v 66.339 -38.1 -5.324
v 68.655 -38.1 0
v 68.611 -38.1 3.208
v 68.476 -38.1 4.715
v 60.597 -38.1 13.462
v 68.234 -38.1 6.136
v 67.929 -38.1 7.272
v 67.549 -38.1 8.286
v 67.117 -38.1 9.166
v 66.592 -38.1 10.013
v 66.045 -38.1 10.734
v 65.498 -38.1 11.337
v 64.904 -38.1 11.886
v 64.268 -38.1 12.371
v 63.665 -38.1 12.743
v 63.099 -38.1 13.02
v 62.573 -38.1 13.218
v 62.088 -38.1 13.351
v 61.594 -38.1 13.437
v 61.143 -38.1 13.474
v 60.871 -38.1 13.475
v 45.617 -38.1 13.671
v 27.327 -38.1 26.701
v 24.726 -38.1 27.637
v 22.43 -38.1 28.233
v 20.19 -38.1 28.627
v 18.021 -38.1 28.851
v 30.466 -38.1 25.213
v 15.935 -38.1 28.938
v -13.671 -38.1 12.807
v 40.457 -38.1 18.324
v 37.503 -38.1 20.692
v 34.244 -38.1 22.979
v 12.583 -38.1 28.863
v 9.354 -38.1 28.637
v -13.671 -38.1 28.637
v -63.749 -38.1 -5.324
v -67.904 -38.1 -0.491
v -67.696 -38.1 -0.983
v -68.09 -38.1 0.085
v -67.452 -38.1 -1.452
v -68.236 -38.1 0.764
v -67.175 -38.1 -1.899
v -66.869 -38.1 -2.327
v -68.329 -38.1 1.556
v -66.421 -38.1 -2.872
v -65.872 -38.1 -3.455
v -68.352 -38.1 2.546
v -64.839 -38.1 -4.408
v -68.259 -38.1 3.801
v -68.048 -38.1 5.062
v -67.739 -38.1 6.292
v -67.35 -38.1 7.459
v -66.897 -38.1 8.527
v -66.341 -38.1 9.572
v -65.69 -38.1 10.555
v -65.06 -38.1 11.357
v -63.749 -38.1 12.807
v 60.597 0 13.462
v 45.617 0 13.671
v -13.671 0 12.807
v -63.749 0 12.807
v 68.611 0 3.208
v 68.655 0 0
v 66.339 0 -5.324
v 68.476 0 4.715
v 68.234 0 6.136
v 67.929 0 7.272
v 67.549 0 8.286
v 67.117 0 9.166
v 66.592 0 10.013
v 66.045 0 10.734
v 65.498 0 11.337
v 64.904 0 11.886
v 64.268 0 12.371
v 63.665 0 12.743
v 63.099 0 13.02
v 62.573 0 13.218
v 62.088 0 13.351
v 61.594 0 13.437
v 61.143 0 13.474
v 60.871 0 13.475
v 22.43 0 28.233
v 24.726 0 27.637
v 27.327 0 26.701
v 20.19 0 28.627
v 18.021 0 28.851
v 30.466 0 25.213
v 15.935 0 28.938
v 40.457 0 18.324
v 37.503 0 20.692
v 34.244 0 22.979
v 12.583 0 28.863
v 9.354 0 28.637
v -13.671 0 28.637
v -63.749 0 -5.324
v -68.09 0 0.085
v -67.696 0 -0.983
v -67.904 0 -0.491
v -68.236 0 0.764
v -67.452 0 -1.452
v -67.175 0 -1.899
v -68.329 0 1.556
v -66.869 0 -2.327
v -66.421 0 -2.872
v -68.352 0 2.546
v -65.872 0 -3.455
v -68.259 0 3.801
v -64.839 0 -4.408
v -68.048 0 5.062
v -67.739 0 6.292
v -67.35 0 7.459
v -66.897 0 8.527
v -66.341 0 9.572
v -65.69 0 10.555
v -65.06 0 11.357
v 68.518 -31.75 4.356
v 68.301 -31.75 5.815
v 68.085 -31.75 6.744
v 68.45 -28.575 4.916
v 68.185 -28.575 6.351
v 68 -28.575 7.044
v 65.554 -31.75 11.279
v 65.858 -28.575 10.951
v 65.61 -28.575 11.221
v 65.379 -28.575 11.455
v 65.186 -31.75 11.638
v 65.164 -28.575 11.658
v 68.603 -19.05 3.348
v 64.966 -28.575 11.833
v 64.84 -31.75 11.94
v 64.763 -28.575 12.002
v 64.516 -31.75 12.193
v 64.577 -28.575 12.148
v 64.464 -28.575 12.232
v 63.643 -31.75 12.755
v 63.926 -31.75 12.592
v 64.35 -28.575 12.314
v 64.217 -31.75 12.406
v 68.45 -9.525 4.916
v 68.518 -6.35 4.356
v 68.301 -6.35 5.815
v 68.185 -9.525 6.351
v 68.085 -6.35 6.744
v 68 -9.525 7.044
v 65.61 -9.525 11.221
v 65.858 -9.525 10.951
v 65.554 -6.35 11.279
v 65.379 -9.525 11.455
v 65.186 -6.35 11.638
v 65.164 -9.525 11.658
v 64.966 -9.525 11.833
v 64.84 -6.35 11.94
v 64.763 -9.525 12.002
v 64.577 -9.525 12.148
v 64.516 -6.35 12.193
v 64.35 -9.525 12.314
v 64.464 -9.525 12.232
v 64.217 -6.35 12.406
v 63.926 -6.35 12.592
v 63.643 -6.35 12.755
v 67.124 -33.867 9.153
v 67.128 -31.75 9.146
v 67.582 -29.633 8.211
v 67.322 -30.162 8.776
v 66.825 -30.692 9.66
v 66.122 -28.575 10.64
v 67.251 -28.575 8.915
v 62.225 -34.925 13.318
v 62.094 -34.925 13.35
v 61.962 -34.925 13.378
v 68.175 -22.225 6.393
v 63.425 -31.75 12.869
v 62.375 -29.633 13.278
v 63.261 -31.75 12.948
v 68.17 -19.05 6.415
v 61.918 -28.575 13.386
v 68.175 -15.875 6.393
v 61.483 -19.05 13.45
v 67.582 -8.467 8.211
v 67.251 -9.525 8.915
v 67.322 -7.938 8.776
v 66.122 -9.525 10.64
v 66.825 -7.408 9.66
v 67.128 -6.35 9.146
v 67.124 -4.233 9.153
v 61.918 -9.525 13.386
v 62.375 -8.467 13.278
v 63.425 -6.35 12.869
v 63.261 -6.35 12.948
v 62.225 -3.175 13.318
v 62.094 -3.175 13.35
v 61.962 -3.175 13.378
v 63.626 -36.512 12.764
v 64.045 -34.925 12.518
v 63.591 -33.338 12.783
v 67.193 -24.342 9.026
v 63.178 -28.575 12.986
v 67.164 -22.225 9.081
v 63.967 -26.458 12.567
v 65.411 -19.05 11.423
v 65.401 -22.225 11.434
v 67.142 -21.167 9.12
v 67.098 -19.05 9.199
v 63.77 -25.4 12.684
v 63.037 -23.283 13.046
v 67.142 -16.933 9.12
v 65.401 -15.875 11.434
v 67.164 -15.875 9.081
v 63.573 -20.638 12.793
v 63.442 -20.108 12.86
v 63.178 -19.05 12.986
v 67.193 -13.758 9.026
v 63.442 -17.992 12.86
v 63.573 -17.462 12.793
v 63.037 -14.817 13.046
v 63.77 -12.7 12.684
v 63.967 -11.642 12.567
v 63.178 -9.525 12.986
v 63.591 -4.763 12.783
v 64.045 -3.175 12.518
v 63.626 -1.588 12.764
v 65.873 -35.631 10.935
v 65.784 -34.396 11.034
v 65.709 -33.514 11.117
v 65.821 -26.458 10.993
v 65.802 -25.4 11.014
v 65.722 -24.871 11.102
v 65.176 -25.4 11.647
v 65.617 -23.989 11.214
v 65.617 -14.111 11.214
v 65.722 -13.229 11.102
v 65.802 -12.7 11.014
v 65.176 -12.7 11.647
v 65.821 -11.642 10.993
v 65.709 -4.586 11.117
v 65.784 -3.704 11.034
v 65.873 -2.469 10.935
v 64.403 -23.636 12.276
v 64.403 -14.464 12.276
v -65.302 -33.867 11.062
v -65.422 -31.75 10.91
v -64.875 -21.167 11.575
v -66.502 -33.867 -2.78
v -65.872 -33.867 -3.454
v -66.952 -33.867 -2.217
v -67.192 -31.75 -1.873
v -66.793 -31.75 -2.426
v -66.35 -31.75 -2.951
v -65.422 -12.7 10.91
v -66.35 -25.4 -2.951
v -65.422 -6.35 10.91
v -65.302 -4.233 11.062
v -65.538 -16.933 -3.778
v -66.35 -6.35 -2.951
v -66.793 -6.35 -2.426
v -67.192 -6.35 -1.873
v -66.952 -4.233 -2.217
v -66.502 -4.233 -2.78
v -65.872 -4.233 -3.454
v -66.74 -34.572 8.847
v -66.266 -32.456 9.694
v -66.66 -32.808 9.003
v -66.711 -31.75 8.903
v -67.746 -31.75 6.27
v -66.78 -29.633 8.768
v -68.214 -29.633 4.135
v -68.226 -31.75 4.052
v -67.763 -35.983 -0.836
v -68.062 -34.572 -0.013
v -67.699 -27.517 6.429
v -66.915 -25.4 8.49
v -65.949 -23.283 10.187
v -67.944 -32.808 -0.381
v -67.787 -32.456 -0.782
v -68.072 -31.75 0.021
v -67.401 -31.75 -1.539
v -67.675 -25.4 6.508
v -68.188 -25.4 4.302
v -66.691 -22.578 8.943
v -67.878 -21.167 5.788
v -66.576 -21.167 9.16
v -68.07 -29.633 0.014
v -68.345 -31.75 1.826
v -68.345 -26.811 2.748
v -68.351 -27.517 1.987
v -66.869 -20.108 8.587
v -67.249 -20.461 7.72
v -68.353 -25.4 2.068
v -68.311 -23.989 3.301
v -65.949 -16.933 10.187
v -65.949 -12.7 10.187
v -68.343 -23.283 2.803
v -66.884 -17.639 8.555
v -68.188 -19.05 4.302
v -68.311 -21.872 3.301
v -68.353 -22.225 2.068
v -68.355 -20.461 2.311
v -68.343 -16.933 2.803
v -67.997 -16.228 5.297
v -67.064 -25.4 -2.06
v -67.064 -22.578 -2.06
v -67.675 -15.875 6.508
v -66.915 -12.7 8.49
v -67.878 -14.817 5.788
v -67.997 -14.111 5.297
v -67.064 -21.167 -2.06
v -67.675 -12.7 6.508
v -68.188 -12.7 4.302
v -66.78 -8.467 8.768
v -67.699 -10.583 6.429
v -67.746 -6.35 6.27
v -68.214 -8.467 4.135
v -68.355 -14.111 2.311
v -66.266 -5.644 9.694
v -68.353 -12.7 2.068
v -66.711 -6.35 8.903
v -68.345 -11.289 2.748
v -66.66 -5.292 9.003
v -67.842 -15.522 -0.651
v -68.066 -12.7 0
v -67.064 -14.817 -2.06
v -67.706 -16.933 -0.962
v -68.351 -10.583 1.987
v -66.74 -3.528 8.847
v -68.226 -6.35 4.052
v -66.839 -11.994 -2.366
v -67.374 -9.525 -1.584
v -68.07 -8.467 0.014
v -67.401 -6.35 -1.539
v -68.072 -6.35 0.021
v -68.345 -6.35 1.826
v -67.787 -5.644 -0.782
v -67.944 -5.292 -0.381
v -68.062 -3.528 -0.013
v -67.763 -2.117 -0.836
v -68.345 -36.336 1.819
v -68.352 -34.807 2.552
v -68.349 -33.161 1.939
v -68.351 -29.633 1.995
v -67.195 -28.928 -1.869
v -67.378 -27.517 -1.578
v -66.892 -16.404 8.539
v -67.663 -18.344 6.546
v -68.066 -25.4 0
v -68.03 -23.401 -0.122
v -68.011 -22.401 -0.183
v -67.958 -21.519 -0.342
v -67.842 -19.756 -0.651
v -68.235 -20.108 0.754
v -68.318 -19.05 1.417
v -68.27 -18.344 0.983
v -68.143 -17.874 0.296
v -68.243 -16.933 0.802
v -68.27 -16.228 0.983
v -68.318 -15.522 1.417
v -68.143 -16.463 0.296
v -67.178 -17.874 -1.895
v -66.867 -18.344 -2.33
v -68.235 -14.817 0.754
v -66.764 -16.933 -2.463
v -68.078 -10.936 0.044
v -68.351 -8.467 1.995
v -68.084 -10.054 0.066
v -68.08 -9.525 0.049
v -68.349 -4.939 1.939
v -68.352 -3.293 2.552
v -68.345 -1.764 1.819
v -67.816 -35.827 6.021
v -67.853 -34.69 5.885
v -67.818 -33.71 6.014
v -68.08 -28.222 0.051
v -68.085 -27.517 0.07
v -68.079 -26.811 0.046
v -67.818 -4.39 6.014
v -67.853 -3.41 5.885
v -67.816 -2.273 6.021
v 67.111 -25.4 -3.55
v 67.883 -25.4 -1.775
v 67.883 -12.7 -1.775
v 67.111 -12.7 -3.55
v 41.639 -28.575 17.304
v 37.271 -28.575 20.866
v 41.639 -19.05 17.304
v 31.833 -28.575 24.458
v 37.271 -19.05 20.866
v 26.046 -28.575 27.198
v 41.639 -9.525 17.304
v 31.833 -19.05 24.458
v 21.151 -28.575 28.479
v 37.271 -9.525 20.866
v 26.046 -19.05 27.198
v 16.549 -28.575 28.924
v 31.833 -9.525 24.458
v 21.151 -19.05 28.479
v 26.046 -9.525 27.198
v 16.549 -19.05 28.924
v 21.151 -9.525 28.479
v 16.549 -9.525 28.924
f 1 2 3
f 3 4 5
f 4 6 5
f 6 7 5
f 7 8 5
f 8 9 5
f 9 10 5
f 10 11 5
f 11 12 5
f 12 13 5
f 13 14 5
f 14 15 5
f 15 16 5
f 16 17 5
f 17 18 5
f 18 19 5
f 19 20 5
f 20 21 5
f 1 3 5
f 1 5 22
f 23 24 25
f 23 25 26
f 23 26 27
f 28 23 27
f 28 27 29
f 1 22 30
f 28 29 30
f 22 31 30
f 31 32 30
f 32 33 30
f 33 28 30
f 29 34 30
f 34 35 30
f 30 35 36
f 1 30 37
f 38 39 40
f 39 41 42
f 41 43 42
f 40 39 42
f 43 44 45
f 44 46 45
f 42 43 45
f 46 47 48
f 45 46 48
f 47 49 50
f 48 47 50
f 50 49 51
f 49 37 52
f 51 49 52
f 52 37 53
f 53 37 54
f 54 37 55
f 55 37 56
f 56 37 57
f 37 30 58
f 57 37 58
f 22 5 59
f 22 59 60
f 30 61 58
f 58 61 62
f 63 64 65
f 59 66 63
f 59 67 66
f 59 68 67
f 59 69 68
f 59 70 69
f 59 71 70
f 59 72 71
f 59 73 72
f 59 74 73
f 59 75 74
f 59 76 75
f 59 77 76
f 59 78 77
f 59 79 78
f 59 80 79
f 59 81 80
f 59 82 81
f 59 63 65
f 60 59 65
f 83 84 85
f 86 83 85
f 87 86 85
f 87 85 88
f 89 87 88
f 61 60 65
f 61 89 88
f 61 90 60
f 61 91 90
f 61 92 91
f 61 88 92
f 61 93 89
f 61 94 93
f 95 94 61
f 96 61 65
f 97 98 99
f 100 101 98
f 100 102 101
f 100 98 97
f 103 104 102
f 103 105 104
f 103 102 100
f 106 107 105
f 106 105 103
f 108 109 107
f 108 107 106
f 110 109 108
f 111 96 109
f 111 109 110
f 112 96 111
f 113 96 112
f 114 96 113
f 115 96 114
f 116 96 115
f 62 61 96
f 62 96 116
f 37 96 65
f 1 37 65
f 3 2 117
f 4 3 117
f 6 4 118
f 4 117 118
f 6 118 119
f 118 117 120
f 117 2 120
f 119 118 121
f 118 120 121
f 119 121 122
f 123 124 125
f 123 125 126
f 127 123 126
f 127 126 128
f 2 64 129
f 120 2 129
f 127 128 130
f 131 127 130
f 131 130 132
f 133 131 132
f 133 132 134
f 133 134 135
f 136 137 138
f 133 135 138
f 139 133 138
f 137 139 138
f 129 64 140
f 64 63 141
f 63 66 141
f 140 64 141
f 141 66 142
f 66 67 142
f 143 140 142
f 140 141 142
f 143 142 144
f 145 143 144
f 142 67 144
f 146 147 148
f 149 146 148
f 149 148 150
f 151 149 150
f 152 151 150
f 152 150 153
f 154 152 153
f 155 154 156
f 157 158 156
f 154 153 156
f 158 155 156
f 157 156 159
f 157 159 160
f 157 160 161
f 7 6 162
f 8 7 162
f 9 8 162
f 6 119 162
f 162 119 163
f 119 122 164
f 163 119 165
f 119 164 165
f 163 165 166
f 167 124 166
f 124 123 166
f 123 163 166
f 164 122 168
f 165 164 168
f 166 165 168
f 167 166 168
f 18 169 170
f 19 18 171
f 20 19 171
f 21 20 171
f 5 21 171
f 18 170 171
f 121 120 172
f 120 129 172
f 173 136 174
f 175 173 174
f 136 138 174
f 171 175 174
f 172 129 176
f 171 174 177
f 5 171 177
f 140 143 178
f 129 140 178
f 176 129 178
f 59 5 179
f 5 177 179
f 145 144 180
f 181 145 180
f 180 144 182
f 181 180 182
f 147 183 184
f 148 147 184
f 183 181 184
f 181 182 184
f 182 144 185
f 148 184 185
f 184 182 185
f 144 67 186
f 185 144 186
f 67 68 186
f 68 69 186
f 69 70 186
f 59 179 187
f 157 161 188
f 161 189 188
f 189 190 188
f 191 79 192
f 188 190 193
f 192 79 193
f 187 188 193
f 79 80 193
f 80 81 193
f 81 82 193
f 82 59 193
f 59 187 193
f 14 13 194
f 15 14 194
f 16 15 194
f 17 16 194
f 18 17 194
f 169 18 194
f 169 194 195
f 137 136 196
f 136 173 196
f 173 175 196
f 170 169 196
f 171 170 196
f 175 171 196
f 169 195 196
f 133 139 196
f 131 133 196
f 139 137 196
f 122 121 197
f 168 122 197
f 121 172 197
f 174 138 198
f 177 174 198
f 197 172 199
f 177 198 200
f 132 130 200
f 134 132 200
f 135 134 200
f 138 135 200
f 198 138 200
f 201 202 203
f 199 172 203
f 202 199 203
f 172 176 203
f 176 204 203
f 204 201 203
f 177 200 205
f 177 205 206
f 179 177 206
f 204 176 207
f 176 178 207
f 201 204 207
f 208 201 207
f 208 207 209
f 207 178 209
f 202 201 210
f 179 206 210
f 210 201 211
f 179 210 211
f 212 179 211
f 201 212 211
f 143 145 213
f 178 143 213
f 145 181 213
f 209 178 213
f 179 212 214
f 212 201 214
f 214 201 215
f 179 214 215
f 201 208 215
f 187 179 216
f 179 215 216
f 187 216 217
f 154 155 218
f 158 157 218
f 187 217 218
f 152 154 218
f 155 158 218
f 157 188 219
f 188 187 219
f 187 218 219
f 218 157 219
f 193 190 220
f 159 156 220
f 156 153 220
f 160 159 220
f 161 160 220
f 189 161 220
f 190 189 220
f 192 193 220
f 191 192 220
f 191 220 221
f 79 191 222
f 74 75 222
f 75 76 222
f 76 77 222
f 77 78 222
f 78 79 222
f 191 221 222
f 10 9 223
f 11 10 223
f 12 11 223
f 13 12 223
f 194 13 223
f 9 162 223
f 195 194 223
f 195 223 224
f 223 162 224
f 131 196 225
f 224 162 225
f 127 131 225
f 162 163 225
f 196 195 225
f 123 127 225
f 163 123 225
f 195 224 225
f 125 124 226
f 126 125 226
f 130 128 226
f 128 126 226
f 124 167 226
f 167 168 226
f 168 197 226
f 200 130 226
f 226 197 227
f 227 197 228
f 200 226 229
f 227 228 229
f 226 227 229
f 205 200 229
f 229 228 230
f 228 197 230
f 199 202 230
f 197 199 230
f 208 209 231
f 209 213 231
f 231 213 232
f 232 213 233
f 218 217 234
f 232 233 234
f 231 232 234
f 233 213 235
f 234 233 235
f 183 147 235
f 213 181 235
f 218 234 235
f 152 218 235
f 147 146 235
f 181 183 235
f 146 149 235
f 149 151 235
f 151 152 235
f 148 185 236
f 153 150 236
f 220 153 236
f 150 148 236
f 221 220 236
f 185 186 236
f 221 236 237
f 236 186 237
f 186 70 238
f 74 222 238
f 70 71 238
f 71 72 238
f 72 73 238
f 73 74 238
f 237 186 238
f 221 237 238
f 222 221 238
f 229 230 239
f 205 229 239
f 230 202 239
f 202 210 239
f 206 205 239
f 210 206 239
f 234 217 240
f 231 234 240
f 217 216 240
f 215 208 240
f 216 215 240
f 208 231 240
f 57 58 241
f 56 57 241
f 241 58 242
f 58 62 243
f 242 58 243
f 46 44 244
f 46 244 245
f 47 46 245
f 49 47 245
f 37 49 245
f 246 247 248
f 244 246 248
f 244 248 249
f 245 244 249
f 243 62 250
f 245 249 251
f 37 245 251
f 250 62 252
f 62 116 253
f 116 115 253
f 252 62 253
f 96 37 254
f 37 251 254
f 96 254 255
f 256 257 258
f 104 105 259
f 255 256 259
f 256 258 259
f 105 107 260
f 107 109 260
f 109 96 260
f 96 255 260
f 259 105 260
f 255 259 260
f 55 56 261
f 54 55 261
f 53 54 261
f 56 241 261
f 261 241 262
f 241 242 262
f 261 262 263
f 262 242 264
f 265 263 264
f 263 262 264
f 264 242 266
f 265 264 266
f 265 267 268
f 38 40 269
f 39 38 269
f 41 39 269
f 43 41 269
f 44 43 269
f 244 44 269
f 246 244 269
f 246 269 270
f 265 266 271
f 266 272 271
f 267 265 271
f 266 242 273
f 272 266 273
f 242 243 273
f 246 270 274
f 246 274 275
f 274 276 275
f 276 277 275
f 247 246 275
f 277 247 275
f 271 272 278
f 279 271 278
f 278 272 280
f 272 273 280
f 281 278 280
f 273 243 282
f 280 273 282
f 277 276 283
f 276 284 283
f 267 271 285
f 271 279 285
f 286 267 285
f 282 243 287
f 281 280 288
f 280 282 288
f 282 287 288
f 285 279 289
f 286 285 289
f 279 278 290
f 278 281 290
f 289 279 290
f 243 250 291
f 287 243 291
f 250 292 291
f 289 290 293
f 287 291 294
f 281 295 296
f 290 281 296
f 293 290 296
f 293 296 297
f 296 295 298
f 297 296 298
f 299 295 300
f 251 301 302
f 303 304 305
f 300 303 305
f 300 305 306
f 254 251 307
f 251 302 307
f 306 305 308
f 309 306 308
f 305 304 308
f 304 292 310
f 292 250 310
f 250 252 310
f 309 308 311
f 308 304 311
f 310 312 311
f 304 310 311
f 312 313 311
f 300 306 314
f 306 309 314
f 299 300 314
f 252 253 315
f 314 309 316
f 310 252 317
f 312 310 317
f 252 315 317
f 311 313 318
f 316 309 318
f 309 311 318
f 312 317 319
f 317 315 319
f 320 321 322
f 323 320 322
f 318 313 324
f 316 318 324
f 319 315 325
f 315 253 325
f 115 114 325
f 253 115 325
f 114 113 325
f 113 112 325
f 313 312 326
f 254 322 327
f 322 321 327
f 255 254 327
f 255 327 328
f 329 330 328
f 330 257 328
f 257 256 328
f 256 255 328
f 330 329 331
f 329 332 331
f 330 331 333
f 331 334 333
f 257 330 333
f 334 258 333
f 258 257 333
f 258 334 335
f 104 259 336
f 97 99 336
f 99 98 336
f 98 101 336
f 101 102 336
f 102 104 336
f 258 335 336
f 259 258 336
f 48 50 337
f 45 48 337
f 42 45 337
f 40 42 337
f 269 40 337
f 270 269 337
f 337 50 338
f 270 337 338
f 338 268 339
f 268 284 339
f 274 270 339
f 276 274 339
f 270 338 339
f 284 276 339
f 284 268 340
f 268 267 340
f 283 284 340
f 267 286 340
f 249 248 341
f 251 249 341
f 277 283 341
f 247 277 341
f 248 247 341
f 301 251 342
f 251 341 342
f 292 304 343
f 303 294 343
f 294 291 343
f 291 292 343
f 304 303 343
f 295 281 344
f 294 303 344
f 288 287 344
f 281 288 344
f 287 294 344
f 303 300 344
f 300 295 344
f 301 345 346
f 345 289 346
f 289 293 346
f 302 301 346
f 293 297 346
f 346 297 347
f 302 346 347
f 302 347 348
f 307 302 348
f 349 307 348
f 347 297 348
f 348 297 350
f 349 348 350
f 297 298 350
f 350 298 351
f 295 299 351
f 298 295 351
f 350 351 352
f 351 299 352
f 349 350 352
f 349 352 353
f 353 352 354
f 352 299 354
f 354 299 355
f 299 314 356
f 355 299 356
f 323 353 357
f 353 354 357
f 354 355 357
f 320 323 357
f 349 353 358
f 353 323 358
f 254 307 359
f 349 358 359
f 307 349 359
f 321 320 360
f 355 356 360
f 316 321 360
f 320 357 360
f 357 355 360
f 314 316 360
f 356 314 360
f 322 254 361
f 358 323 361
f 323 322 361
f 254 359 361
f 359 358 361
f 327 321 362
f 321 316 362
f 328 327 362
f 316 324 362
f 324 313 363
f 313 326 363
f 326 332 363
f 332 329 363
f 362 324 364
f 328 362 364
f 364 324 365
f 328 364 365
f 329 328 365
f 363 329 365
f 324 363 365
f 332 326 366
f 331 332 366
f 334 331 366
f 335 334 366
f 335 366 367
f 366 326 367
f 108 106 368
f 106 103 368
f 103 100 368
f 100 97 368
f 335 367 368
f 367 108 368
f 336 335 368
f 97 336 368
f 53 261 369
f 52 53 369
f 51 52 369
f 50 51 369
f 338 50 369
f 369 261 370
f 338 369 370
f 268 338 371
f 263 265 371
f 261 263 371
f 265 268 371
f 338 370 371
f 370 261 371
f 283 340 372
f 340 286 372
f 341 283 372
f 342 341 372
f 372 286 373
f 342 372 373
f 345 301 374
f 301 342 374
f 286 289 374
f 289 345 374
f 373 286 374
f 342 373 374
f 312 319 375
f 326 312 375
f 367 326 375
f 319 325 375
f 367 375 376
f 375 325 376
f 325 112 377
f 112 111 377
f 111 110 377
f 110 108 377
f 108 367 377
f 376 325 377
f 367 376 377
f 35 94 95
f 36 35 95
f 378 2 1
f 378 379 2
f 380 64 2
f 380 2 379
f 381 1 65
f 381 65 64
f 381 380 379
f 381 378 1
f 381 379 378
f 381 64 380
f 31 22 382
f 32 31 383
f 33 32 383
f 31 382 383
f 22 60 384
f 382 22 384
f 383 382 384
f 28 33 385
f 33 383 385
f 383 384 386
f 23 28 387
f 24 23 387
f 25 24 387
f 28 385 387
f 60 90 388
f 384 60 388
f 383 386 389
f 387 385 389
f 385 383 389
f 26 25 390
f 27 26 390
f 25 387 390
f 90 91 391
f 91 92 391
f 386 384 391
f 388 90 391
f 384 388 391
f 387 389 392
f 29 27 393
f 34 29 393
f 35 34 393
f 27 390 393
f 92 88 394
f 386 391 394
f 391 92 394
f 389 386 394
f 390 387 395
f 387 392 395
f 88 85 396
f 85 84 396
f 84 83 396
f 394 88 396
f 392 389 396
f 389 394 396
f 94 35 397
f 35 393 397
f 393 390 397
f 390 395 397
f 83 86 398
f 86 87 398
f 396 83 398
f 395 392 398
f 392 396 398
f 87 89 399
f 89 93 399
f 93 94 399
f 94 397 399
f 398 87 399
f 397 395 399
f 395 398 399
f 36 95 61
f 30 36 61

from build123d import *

# Parameters (mm, degrees)
F1_DEPTH = 38.1


with BuildPart() as f1:
    # F0 (on Front) → F1 (new body)
    with BuildSketch(Plane.XZ):
        with BuildLine():
            add(Edge.make_bspline(
                [(68.6553490639, 0), (67.8833100518, -1.7748021831), (67.1112710397, -3.5496043662), (66.3392320275, -5.3244065493)],
                knots=[0, 0, 0, 0, 5.8063502503, 5.8063502503, 5.8063502503, 5.8063502503], degree=3))
            add(Edge.make_bspline(
                [(68.6553490639, 0), (68.707247909, 3.4879189514), (68.4529513003, 9.3567744092), (63.2849889631, 13.6707741767), (60.5968596619, 13.4617609131)],
                knots=[0, 0, 0, 0, 0.522788236, 1, 1, 1, 1], degree=3))
            Line((60.5968596619, 13.4617609131), (45.6172116101, 13.6707741767))
            add(Edge.make_bspline(
                [(45.6172116101, 13.6707741767), (43.0083947662, 16.1005357318), (37.5783462559, 21.1578946428), (26.441282578, 27.898149577), (16.7039788369, 29.2117741809), (11.6813281493, 28.8187924523), (9.3536879867, 28.6366734654)],
                knots=[0, 0, 0, 0, 0.26138691, 0.5440564386, 0.7887026968, 1, 1, 1, 1], degree=3))
            Line((9.3536879867, 28.6366734654), (0, 28.6366734654))
            Line((0, 28.6366734654), (-13.6707732454, 28.6366734654))
            Line((-13.6707732454, 28.6366734654), (-13.6707732454, 12.8073561937))
            Line((-13.6707732454, 12.8073561937), (-63.7489780784, 12.8073561937))
            add(Edge.make_bspline(
                [(-63.7489780784, 12.8073561937), (-64.8843970064, 11.6005592617), (-67.4562184604, 8.8670604943), (-69.4633168913, -0.5921410666), (-65.5816661345, -3.8066865274), (-63.7489780784, -5.3244065493)],
                knots=[0, 0, 0, 0, 0.2944087678, 0.6668611617, 1, 1, 1, 1], degree=3))
            Line((-63.7489780784, -5.3244065493), (66.3392320275, -5.3244065493))
        make_face()
    extrude(amount=F1_DEPTH)


solid = f1.part
